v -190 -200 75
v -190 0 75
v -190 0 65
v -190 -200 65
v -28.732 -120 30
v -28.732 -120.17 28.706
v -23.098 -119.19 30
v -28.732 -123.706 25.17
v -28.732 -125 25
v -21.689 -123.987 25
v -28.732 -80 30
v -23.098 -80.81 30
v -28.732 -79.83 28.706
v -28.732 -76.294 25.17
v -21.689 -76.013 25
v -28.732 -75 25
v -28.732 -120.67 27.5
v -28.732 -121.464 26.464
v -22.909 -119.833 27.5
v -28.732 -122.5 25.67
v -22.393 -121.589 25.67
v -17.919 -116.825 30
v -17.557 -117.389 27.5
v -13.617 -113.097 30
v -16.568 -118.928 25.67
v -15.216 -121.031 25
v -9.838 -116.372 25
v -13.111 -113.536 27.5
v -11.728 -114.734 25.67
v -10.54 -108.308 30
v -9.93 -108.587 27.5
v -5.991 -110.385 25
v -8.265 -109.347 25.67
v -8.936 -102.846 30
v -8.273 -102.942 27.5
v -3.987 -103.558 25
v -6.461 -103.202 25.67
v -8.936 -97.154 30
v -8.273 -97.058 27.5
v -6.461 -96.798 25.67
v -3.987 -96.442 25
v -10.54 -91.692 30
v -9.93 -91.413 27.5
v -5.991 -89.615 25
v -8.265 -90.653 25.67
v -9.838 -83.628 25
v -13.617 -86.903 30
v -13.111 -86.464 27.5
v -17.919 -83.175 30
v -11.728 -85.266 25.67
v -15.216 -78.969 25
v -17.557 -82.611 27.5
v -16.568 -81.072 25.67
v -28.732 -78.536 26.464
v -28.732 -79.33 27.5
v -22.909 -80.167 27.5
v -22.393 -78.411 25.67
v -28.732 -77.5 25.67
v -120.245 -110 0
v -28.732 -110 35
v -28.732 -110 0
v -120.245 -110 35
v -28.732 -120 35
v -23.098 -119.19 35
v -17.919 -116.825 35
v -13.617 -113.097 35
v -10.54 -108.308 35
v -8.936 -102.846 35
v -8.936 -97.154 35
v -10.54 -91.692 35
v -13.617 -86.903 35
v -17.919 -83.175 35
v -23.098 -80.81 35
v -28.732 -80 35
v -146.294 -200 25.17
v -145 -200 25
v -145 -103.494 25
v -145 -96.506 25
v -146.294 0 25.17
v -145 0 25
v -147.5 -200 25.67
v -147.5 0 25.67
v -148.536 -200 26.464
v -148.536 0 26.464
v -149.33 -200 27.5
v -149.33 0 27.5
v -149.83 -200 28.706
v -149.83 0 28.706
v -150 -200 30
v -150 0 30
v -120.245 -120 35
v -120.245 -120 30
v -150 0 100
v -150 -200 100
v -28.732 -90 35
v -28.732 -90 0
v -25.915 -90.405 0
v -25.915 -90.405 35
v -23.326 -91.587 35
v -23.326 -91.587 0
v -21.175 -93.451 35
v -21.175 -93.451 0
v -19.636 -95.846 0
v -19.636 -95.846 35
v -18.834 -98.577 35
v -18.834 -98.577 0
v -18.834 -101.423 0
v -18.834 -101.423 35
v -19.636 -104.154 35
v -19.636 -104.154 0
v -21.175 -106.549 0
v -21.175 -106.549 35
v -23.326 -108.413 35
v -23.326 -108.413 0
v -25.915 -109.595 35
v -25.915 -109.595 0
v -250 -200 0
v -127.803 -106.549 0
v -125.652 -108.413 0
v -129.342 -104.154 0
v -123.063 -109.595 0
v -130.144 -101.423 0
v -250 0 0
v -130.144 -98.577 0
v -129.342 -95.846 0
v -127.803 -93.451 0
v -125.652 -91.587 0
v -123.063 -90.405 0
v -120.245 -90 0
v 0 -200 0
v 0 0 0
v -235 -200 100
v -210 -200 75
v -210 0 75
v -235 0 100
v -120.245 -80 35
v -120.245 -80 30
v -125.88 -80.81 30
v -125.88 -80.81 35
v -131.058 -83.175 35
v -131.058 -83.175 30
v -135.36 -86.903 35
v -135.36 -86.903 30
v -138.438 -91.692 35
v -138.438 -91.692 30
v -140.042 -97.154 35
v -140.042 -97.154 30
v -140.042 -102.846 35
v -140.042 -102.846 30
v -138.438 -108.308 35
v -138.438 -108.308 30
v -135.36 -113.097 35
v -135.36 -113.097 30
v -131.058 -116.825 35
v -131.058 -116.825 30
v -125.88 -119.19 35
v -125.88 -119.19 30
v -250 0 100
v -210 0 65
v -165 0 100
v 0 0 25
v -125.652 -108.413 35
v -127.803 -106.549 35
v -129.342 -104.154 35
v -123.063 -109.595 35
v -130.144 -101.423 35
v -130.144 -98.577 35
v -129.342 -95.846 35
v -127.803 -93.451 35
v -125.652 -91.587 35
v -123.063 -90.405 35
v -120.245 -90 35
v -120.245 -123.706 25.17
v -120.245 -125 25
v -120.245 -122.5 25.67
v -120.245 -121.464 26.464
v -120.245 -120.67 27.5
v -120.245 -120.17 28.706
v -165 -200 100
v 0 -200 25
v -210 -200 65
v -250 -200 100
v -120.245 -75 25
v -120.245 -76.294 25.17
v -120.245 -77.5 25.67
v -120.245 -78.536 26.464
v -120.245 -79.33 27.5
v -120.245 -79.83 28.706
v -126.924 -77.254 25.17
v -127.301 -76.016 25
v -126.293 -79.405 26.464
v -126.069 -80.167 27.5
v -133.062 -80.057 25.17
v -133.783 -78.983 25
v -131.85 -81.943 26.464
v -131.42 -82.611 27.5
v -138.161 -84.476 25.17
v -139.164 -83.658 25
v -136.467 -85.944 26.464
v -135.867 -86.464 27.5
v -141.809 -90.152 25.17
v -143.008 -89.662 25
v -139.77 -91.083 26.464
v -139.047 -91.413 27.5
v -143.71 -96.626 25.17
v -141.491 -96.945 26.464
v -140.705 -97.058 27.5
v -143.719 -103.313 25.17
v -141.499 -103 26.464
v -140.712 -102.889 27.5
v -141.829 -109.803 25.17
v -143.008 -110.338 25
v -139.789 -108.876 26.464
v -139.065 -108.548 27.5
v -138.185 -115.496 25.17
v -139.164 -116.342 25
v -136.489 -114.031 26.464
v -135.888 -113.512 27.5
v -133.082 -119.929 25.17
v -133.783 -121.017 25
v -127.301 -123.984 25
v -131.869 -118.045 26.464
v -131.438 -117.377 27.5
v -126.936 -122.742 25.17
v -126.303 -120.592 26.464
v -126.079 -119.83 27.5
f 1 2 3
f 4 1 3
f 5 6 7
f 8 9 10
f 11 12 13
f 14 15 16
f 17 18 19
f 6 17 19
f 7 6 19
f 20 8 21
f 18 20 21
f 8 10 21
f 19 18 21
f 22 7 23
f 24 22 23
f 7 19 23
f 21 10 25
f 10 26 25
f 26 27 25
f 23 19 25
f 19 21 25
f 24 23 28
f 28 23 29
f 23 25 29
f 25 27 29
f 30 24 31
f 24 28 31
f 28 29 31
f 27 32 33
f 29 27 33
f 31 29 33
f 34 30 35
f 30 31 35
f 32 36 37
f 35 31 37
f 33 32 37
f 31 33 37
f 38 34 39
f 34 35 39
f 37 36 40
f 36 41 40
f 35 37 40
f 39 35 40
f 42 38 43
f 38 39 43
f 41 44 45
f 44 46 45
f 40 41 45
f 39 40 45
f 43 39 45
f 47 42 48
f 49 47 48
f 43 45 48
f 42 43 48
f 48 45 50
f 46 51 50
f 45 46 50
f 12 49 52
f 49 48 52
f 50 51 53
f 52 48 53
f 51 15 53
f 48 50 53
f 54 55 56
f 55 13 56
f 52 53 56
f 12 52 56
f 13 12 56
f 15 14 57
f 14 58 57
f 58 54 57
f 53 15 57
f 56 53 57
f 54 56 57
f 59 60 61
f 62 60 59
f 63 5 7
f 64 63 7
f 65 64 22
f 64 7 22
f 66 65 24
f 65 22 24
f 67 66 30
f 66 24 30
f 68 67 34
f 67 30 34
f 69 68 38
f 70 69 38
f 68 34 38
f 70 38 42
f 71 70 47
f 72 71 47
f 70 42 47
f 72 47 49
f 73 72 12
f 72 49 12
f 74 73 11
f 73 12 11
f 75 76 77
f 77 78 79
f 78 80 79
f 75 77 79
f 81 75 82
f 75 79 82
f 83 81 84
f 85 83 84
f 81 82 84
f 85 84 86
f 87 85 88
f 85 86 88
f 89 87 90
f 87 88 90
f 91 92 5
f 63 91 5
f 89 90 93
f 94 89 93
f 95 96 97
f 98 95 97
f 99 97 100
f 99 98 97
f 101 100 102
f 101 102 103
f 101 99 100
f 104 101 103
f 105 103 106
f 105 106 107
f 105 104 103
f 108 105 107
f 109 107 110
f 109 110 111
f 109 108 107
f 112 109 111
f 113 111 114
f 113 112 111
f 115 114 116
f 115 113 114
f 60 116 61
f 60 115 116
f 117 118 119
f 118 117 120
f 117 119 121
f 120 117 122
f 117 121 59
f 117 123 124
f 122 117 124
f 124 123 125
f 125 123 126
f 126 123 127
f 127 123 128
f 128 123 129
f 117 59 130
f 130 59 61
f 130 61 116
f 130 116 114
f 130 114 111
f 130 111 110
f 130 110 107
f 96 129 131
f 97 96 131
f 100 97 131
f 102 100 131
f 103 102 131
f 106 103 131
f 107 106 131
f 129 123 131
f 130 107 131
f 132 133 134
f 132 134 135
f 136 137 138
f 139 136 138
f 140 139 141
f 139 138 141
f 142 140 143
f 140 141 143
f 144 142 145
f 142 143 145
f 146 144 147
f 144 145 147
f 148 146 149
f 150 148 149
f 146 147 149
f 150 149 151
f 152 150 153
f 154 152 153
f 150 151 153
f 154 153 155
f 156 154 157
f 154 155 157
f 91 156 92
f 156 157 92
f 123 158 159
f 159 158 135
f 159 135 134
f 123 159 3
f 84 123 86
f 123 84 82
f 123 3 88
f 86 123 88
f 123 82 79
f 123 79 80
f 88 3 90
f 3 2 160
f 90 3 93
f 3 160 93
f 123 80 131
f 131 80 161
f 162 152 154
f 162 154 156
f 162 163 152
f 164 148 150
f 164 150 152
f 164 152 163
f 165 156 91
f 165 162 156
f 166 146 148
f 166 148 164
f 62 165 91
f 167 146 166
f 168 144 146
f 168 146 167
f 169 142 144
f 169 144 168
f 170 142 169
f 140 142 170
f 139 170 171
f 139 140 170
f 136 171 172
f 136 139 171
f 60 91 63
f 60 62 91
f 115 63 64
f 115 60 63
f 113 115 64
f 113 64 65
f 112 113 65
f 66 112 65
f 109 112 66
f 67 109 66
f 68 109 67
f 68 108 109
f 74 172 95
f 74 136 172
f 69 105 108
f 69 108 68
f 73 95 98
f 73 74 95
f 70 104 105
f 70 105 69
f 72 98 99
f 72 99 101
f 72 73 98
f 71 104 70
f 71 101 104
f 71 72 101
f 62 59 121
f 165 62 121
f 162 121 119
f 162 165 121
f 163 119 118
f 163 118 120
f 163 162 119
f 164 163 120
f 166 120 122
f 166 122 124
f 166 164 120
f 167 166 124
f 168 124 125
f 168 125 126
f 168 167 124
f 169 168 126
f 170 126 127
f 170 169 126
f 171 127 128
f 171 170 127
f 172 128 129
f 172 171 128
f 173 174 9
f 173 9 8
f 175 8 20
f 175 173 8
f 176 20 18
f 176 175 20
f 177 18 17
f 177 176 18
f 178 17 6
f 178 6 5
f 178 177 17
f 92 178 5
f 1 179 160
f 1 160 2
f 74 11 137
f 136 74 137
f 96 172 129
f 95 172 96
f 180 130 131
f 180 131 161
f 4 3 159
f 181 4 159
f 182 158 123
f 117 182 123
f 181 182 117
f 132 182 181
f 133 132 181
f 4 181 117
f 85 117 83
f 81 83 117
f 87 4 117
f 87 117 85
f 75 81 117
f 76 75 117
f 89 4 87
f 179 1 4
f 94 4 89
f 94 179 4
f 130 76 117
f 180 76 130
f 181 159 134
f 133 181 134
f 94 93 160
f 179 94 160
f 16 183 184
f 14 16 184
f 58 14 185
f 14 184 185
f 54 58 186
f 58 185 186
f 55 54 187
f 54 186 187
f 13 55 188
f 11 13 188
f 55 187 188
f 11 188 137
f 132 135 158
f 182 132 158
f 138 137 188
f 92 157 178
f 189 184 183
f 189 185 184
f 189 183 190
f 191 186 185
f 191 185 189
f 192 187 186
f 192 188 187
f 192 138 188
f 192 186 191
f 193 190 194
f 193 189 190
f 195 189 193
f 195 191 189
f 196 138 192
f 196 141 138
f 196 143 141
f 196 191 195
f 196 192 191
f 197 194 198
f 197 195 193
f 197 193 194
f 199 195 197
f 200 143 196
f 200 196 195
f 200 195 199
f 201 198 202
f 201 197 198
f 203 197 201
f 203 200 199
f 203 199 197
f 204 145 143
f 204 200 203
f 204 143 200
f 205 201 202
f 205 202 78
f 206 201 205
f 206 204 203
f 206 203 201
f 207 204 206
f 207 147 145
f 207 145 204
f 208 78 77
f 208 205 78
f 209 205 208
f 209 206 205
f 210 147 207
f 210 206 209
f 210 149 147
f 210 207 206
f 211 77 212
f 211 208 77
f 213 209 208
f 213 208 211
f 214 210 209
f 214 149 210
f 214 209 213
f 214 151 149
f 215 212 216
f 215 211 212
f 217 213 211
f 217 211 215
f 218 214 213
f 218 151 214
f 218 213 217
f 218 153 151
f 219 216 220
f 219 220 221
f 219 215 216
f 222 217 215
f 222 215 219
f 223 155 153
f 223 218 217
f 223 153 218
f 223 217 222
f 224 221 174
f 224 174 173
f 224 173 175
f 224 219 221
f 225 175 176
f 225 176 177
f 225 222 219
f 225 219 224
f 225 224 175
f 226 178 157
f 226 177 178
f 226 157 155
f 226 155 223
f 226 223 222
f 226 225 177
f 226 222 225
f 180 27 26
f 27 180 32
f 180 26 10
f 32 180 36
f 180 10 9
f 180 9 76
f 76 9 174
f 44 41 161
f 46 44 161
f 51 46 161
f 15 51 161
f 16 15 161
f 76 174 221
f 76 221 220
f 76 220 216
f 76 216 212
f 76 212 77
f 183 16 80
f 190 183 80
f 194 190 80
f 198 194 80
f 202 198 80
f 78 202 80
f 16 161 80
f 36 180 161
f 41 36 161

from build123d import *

# Parameters (mm, degrees)
F1_DEPTH    = 200
F3_DEPTH    = 10
F4_DEPTH    = 25
F5_T1_DEPTH = 200
F5_T3_DEPTH = 91.5131680667
F5_T6_ANGLE = 180
F5_T8_ANGLE = 180


# Not quite as in the source:
# - a fillet or chamfer that OpenCascade refuses, or shapes differently, is made with other operations: its cross-section is extruded or revolved along the edge and cut away or added


with BuildPart() as f1:
    # F0 (on Front) → F1 (new body)
    with BuildSketch(Plane.XZ):
        Polygon((-250, 0), (0, 0), (0, 25), (-150, 25), (-150, 100), (-165, 100), (-190, 75), (-190, 65), (-210, 65), (-210, 75), (-235, 100), (-250, 100), align=None)
    extrude(amount=F1_DEPTH)

    # F2 (on face) → F3 (join)
    with BuildSketch(Plane.XY.offset(25)):
        with BuildLine():
            Line((-120.2453300357, -120), (-28.7321619689, -120))
            ThreePointArc((-28.7321619689, -120), (-8.7321619689, -100), (-28.7321619689, -80))
            Line((-28.7321619689, -80), (-120.2453300357, -80))
            ThreePointArc((-120.2453300357, -80), (-140.2453300357, -100), (-120.2453300357, -120))
        make_face()
        with BuildLine():
            ThreePointArc((-28.7321619689, -90), (-18.7321619689, -100), (-28.7321619689, -110))
            Line((-28.7321619689, -110), (-120.2453300357, -110))
            ThreePointArc((-120.2453300357, -110), (-130.2453300357, -100), (-120.2453300357, -90))
            Line((-120.2453300357, -90), (-28.7321619689, -90))
        make_face(mode=Mode.SUBTRACT)
    extrude(amount=F3_DEPTH)

    # F4 (cut): a face of the model
    f4_faces = [f1.faces().sort_by_distance(p)[0] for p in [
        (-74.4887460023, -100, 25),
    ]]
    extrude(f4_faces, amount=-F4_DEPTH, mode=Mode.SUBTRACT)

    # F5: fillet of radius 5 on 3 edges, made by hand

    # F5_s2 → F5_t1 (join)
    with BuildSketch(Plane.XZ):
        with BuildLine():
            ThreePointArc((-145, 25), (-148.5355339059, 26.4644660941), (-150, 30))
            Line((-150, 30), (-150, 25))
            Line((-150, 25), (-145, 25))
        make_face()
    extrude(amount=F5_T1_DEPTH)

    # F5_s4 → F5_t3 (join)
    with BuildSketch(Plane.YZ.offset(-120.2453300357)):
        with BuildLine():
            ThreePointArc((-125, 25), (-121.4644660941, 26.4644660941), (-120, 30))
            Line((-120, 30), (-120, 25))
            Line((-120, 25), (-125, 25))
        make_face()
        with BuildLine():
            ThreePointArc((-75, 25), (-78.5355339059, 26.4644660941), (-80, 30))
            Line((-80, 30), (-80, 25))
            Line((-80, 25), (-75, 25))
        make_face()
    extrude(amount=F5_T3_DEPTH)

    # F5_s5 → F5_t6 (revolve)
    with BuildSketch(Plane.YZ.offset(-28.7321619689)):
        with BuildLine():
            ThreePointArc((-120, 30), (-121.4644660941, 26.4644660941), (-125, 25))
            Line((-125, 25), (-120, 25))
            Line((-120, 25), (-120, 30))
        make_face()
    revolve(axis=Axis((-28.7321619689, -100, 25), (0, 0, 1)), revolution_arc=F5_T6_ANGLE)

    # F5_s7 → F5_t8 (revolve)
    with BuildSketch(Plane.YZ.offset(-120.2453300357)):
        with BuildLine():
            ThreePointArc((-75, 25), (-78.5355339059, 26.4644660941), (-80, 30))
            Line((-80, 30), (-80, 25))
            Line((-80, 25), (-75, 25))
        make_face()
    revolve(axis=Axis((-120.2453300357, -100, 25), (0, 0, 1)), revolution_arc=F5_T8_ANGLE)


solid = f1.part
